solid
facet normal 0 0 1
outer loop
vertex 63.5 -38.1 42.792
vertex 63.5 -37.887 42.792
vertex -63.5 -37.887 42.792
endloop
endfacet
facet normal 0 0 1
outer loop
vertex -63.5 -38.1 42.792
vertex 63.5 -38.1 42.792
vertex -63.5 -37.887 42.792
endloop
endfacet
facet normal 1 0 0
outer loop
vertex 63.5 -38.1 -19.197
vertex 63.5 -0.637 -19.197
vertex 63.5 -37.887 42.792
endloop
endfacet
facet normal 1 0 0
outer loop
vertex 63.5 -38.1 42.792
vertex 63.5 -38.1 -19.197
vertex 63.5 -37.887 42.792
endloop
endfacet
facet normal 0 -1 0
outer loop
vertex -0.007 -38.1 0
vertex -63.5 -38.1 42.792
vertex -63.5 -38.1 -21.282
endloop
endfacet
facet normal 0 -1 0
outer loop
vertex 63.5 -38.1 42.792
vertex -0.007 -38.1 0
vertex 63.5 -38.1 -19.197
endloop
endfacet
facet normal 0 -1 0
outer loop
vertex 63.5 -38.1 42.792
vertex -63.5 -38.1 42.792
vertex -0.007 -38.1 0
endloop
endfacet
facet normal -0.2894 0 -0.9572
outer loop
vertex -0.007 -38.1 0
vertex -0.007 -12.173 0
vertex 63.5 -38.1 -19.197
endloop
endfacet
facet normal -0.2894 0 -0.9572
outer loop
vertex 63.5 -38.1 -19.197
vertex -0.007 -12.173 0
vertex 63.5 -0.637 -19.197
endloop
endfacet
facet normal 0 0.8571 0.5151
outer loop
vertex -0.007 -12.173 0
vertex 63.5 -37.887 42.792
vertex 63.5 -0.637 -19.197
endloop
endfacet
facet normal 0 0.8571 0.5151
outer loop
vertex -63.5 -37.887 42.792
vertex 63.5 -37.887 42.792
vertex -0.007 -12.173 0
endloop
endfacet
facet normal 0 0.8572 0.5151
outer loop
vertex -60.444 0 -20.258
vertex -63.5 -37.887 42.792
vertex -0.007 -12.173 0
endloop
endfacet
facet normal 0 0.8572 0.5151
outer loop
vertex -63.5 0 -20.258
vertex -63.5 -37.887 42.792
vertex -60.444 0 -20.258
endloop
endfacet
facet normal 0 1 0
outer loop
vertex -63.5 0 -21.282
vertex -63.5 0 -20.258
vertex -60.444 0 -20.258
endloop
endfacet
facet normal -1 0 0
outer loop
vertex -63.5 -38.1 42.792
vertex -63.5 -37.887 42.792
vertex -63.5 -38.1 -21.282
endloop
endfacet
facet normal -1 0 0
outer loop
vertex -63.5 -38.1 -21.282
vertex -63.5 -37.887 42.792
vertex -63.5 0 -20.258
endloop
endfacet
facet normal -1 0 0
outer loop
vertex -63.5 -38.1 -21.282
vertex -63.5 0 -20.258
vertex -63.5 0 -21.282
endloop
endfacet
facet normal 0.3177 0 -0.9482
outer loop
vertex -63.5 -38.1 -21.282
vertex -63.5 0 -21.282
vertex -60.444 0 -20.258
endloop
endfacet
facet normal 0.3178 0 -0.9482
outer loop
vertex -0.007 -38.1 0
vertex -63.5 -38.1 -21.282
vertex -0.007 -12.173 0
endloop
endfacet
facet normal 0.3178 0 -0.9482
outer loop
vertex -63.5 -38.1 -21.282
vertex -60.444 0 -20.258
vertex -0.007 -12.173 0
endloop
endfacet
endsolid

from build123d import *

# Parameters (mm, degrees)
F1_DEPTH = 38.1
F3_DEPTH = 106.172
F4_DEPTH = 85.598


with BuildPart() as f1:
    # F0 (on Front) → F1 (new body)
    with BuildSketch(Plane.XZ):
        Polygon((63.5, 42.791789), (0, 42.791789), (-63.5, 42.791789), (-63.5, -21.281976), (-0.006818, 0), (63.5, -19.196785), align=None)
    extrude(amount=F1_DEPTH)

    # F2 (on Right) → F3 (cut)
    with BuildSketch(Plane.YZ):
        Polygon((0, -20.257542), (0, 43.2841), (-38.183279, 43.2841), align=None)
    extrude(amount=-F3_DEPTH, mode=Mode.SUBTRACT)

    # F2 (on Right) → F4 (cut)
    with BuildSketch(Plane.YZ):
        Polygon((0, -20.257542), (0, 43.2841), (-38.183279, 43.2841), align=None)
    extrude(amount=F4_DEPTH, mode=Mode.SUBTRACT)


solid = f1.part
